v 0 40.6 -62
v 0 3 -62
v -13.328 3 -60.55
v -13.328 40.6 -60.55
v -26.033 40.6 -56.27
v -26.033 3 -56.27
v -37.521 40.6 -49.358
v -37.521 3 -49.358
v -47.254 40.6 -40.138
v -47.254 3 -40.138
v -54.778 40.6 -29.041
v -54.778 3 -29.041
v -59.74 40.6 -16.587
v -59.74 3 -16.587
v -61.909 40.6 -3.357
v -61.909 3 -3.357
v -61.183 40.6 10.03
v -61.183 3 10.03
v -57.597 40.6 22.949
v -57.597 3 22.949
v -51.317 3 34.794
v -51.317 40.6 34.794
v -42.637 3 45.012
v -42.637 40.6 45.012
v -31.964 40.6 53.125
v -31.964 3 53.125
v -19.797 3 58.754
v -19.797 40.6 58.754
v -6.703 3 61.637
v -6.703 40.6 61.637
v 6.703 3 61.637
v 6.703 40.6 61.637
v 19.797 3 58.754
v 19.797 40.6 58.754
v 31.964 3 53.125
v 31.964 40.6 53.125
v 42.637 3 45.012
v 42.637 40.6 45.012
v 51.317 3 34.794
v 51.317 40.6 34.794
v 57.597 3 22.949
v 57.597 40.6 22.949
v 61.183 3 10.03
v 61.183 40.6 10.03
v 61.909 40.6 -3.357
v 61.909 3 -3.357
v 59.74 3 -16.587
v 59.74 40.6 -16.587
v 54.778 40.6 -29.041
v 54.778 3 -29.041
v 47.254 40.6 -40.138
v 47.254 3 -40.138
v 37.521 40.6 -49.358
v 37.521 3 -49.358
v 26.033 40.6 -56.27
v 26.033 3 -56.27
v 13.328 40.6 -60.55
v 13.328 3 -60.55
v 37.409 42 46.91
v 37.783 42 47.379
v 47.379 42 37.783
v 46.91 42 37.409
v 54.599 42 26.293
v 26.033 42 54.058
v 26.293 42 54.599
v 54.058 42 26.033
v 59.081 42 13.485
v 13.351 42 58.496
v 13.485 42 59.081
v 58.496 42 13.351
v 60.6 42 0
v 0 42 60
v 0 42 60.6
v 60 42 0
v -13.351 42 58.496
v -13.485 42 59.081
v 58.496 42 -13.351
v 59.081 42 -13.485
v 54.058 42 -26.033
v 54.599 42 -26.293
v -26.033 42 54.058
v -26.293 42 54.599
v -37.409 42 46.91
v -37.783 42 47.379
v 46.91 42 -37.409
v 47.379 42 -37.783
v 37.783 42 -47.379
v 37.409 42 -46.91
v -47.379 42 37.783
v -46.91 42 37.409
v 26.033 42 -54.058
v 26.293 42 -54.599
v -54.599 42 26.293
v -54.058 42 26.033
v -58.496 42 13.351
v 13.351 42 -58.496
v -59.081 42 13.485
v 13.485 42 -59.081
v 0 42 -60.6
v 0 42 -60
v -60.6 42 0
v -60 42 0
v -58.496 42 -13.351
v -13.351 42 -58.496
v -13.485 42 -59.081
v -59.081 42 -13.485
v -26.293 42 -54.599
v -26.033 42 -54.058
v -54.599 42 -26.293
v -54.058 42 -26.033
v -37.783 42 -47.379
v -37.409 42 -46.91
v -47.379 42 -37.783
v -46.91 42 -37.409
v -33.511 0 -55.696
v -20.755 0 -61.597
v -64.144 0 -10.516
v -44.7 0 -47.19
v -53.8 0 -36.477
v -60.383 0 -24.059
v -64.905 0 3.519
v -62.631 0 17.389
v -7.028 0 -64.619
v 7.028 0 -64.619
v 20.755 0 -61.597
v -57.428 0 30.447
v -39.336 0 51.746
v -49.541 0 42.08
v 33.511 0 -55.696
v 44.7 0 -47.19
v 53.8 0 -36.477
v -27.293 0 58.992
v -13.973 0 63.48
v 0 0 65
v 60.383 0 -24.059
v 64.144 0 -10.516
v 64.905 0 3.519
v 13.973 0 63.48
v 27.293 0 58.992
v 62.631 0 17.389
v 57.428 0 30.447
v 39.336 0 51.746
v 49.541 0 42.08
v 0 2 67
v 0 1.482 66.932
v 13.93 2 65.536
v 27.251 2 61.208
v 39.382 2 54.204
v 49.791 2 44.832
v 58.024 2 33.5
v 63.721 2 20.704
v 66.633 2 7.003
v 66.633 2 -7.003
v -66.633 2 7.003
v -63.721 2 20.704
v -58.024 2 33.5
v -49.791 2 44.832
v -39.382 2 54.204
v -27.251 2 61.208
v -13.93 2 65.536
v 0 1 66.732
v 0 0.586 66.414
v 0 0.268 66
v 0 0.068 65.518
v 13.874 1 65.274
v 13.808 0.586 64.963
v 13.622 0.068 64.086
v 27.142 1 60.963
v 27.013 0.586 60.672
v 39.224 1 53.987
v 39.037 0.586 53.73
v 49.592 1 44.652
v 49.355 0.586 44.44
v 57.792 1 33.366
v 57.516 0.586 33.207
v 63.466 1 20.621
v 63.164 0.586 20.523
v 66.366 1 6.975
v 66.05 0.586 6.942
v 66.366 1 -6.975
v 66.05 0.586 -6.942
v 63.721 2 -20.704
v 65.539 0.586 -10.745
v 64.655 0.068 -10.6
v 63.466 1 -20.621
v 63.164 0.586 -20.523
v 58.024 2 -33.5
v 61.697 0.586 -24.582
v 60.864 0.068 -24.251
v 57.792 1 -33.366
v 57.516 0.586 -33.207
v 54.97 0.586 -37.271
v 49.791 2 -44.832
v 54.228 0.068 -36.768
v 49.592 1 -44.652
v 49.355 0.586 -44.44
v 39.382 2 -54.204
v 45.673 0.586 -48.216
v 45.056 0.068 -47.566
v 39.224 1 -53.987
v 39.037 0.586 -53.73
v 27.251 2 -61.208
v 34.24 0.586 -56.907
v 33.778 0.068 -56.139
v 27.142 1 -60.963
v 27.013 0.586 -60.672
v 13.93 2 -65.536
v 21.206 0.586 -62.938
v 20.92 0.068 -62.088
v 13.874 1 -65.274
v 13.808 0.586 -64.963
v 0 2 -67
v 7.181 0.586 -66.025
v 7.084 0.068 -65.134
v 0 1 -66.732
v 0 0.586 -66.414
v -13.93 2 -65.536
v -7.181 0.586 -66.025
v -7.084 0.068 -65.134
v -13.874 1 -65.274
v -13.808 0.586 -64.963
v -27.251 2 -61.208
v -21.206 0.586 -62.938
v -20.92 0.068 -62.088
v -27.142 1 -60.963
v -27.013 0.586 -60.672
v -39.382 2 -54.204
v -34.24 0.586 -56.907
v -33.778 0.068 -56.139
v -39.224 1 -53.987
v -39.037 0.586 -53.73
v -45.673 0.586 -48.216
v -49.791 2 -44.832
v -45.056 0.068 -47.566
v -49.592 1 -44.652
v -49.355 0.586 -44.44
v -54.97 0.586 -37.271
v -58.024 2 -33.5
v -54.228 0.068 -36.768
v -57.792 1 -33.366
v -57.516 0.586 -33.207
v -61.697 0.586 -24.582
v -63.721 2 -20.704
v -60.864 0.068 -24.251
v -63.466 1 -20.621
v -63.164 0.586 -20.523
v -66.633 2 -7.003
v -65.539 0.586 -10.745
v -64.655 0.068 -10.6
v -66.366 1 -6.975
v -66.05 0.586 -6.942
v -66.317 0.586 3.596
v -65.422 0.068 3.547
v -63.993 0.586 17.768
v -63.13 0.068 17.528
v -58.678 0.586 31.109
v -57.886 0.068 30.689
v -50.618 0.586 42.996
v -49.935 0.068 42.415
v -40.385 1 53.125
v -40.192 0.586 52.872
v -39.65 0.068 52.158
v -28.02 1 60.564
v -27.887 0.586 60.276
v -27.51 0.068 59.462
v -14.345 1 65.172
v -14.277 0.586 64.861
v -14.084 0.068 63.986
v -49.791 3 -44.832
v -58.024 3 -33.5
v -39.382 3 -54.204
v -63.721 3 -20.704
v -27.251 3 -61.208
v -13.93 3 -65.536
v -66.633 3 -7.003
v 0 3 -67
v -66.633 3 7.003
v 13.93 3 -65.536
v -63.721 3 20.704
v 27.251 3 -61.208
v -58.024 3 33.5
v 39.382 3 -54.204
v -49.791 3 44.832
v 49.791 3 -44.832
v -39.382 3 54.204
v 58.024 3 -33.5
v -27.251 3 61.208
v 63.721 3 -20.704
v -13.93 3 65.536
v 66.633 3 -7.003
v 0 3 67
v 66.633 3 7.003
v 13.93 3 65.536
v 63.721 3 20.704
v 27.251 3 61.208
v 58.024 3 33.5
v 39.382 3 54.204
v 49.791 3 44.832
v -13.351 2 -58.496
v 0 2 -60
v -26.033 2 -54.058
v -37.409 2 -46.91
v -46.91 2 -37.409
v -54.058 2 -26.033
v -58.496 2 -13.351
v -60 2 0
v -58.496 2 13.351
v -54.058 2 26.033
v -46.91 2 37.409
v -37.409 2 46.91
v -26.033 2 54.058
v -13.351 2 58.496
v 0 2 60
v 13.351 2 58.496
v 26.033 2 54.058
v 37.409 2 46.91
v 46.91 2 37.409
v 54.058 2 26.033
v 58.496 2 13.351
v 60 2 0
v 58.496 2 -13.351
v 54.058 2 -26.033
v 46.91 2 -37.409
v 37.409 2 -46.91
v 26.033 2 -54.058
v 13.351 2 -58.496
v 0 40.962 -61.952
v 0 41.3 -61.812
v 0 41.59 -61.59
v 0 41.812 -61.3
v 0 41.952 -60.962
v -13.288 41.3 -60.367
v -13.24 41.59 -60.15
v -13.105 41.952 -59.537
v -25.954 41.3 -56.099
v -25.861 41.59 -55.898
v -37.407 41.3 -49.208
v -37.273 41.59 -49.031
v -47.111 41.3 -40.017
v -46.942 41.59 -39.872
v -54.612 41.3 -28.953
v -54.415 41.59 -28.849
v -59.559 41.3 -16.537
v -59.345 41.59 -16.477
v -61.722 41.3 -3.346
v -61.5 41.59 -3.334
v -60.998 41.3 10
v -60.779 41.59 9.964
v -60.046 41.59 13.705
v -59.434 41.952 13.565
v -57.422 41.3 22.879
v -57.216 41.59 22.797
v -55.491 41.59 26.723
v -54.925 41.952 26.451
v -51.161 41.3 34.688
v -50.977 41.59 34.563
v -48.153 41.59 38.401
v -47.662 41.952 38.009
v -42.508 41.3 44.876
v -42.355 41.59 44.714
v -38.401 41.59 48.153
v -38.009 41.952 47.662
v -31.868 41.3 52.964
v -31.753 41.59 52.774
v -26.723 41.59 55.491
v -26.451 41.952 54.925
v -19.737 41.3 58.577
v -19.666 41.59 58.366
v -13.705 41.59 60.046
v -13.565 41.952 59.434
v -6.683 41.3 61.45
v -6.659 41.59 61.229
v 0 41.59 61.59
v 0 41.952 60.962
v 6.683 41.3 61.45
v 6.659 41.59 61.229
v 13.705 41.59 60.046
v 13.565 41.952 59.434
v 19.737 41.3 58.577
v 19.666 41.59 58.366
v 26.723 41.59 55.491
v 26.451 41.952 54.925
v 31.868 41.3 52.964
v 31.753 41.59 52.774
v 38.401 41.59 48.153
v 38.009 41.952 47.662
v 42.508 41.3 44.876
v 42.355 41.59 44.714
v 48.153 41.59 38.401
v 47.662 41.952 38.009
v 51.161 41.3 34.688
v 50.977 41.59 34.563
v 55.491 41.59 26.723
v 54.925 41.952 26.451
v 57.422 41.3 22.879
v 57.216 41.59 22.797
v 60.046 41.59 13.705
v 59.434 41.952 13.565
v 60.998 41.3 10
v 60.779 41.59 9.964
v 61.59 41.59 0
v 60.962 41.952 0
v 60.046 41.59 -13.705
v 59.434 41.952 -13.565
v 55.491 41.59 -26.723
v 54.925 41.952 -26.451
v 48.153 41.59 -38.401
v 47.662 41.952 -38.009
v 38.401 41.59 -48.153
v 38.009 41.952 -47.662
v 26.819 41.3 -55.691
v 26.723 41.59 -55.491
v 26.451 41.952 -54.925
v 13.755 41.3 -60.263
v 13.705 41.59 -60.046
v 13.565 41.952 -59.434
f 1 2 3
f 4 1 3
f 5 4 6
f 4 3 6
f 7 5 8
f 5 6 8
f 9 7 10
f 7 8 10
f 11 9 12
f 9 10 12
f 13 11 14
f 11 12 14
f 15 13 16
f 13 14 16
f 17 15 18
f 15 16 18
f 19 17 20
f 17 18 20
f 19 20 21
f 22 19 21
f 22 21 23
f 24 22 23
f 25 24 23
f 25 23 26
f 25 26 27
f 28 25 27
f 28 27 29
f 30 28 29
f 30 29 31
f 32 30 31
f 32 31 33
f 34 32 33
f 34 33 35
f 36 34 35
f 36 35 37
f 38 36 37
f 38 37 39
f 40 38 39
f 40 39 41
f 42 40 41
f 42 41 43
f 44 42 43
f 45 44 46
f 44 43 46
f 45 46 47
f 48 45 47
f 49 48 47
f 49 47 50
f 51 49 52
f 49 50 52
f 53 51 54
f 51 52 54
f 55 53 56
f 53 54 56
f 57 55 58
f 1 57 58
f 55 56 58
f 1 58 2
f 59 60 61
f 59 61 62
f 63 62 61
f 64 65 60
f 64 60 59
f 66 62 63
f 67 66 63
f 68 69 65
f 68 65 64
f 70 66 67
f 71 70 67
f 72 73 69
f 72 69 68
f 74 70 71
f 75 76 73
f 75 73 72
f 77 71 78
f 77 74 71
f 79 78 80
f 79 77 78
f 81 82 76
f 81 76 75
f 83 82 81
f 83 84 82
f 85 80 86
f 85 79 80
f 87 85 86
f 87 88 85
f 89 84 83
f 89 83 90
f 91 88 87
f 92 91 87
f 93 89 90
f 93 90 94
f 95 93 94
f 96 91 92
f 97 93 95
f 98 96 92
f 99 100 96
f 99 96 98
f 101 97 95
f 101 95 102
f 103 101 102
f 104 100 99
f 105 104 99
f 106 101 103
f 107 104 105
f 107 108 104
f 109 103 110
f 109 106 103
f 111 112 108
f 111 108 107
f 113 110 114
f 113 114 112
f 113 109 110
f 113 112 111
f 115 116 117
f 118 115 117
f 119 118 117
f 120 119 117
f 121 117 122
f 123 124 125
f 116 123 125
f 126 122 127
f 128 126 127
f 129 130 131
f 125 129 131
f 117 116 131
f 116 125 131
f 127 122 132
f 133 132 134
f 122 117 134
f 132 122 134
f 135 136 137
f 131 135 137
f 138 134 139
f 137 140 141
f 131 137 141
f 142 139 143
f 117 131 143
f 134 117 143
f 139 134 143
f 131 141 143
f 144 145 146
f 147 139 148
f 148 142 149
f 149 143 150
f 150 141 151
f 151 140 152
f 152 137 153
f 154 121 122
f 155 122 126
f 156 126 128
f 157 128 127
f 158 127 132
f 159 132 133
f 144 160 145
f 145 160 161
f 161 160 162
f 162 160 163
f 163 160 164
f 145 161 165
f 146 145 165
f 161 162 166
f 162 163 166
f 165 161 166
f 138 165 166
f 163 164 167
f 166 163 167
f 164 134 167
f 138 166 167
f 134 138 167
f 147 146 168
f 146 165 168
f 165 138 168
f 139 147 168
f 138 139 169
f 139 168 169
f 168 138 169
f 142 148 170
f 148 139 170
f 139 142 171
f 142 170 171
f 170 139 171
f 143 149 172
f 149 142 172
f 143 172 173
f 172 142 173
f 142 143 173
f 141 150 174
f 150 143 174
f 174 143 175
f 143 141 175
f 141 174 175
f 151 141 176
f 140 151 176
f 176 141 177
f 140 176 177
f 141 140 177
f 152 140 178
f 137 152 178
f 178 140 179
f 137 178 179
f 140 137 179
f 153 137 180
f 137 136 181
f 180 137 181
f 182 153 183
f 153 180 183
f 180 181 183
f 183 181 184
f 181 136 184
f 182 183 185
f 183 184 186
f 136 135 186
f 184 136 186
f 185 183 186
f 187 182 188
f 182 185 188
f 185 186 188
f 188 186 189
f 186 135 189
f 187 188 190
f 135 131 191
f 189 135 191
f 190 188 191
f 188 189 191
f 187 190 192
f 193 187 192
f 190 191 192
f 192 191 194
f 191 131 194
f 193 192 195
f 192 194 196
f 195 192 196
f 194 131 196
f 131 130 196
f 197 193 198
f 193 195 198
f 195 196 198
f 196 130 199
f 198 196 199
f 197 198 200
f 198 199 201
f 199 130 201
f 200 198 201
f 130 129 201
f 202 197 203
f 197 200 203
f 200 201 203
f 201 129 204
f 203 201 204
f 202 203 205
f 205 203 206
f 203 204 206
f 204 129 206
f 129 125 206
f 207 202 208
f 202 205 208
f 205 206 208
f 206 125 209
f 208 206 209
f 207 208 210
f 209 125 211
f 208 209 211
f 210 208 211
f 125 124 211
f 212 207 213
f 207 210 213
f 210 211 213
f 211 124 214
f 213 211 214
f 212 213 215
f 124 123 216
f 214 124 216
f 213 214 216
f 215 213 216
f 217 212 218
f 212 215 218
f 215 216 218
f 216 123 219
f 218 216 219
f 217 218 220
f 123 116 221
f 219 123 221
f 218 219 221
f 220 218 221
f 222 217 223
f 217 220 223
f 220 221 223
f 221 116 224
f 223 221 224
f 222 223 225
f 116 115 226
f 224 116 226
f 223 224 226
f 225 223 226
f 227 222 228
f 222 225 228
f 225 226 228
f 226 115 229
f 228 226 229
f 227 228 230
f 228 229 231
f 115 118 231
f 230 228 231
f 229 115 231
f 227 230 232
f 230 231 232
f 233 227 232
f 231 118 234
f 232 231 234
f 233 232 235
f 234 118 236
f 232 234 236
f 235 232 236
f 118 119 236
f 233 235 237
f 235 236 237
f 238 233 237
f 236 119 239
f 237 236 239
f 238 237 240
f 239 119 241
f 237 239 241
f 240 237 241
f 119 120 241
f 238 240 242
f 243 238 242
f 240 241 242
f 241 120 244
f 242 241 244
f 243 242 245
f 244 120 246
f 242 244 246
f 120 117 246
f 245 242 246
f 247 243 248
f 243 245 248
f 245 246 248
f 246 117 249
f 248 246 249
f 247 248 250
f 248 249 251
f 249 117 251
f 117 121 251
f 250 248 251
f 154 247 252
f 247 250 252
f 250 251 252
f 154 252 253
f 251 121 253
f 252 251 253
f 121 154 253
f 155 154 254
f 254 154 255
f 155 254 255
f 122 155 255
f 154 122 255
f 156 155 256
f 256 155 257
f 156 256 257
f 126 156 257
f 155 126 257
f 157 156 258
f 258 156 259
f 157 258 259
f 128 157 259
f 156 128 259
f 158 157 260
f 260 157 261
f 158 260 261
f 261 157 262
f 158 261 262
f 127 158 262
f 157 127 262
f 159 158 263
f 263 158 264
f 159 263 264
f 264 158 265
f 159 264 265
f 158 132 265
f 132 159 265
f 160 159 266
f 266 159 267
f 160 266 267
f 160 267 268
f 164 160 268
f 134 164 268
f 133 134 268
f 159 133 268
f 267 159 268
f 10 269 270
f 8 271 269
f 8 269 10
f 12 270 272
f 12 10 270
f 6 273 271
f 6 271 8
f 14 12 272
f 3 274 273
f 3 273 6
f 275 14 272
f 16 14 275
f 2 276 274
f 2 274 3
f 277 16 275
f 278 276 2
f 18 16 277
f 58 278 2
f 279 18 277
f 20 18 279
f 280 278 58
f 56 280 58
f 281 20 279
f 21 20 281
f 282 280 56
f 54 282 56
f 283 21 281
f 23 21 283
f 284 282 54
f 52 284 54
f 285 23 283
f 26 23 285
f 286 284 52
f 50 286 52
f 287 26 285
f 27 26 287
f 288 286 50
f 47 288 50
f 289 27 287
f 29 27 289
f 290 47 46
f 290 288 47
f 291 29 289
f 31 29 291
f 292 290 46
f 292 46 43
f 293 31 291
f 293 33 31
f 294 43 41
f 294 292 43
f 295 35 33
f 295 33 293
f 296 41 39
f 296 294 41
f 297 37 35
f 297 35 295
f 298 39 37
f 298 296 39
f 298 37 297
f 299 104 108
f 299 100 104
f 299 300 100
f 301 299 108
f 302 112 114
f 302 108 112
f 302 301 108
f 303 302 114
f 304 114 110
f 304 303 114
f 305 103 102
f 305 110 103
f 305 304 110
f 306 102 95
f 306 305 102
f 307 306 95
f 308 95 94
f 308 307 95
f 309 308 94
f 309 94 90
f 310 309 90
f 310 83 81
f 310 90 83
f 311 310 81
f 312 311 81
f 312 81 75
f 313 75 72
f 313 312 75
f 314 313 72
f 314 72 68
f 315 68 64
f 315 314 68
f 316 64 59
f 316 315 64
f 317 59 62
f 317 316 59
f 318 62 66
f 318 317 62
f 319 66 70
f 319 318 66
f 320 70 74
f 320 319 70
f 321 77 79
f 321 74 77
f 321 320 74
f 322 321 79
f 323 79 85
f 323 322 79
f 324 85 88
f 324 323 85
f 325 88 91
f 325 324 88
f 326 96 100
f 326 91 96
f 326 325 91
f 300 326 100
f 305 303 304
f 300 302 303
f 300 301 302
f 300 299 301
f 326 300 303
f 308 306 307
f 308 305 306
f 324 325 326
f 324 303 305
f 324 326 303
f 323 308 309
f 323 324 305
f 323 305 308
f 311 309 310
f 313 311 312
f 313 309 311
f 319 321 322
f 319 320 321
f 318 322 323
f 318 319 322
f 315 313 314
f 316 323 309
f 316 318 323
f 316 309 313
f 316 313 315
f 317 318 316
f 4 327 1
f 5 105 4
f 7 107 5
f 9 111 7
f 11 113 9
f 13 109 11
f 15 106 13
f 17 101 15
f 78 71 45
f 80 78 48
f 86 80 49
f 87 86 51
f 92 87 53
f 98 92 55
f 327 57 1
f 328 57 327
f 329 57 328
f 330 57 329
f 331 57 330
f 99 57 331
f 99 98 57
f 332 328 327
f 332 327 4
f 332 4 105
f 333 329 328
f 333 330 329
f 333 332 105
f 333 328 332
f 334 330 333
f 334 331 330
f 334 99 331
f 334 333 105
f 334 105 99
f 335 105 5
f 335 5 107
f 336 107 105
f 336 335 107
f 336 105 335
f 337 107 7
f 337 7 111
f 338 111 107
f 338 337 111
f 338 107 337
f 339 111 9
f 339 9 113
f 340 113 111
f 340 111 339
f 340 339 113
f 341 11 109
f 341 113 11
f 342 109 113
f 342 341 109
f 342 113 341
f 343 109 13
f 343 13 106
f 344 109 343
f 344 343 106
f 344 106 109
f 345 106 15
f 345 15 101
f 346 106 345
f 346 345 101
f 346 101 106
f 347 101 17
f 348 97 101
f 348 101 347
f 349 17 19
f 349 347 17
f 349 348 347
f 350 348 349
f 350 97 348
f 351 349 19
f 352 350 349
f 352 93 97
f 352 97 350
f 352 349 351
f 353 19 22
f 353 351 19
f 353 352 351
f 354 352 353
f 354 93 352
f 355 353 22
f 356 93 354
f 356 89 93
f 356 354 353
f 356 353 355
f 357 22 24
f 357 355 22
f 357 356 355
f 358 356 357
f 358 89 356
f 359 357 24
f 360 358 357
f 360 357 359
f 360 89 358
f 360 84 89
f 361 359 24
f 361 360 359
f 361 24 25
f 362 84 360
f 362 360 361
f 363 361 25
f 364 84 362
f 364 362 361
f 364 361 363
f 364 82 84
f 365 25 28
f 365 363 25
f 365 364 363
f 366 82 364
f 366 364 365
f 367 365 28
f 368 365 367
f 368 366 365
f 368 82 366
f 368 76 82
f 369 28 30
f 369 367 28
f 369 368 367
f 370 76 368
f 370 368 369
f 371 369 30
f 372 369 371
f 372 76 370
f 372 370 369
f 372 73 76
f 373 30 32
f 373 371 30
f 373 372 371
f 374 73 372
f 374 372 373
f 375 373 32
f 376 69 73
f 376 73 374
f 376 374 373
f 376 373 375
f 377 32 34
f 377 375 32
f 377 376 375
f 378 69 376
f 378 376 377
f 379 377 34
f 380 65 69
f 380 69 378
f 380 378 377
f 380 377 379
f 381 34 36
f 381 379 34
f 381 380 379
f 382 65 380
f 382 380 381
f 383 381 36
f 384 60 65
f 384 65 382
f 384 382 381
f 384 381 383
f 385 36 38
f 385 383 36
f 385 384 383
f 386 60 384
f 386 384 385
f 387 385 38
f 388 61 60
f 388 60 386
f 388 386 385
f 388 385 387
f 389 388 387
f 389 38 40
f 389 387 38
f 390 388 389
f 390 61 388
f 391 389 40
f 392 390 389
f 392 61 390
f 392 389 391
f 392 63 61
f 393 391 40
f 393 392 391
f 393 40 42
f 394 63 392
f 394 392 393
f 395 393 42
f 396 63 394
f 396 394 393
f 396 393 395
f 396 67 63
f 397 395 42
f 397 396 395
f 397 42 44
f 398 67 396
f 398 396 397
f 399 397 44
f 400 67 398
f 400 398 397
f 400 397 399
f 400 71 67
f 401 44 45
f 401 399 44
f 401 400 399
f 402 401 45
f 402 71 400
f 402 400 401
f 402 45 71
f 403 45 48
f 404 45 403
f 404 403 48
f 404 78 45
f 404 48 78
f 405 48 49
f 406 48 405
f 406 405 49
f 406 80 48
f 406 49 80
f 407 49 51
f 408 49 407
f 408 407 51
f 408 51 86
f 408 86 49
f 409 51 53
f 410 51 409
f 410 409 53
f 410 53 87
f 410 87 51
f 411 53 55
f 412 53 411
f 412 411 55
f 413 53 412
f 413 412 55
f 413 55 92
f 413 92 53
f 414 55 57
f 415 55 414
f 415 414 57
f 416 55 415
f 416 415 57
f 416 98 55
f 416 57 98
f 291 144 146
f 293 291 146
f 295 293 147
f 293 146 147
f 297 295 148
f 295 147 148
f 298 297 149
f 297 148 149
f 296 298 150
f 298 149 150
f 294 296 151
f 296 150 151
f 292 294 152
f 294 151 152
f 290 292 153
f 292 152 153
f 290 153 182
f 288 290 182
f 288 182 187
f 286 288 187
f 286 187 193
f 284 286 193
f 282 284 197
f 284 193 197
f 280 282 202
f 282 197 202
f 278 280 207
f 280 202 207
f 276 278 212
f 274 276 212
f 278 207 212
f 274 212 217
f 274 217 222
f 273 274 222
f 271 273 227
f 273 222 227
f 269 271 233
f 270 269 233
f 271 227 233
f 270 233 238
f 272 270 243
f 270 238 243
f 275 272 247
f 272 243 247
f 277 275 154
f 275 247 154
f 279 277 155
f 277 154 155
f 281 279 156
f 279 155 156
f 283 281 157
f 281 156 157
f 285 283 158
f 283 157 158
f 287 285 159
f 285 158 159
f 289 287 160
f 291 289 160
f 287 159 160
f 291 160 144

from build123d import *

# Parameters (mm, degrees)
SKETCH1_R           = 62
BOSS_EXTRUDE1_DEPTH = 42
SKETCH2_R           = 67
BOSS_EXTRUDE2_DEPTH = 3
FILLET1_R           = 2
SHELL1_T            = -2
FILLET2_R           = 1.4


with BuildPart() as part:
    # Sketch1 → Boss-Extrude1 (new body)
    with BuildSketch(Plane(origin=(0, 0, 0), x_dir=(1, 0, 0), z_dir=(0, 1, 0))):
        with Locations(Location((0, 0, 0), (0, 0, 90))):
            Circle(SKETCH1_R)
    extrude(amount=BOSS_EXTRUDE1_DEPTH)

    # Sketch2 → Boss-Extrude2 (add)
    with BuildSketch(Plane(origin=(0, 0, 0), x_dir=(1, 0, 0), z_dir=(0, 1, 0))):
        with Locations(Location((0, 0, 0), (0, 0, 270))):
            Circle(SKETCH2_R)
    extrude(amount=BOSS_EXTRUDE2_DEPTH)

    # Fillet1
    fillet1_edges = [part.edges().sort_by_distance(p)[0] for p in [
        (0, 0, -67),
    ]]
    fillet(fillet1_edges, radius=FILLET1_R)

    # Shell1
    shell1_openings = [part.faces().sort_by_distance(p)[0] for p in [
        (0, 42, 0),
    ]]
    offset(amount=SHELL1_T, openings=shell1_openings, kind=Kind.INTERSECTION)

    # Fillet2
    fillet2_edges = [part.edges().sort_by_distance(p)[0] for p in [
        (0, 42, 62),
    ]]
    fillet(fillet2_edges, radius=FILLET2_R)


solid = part.part
